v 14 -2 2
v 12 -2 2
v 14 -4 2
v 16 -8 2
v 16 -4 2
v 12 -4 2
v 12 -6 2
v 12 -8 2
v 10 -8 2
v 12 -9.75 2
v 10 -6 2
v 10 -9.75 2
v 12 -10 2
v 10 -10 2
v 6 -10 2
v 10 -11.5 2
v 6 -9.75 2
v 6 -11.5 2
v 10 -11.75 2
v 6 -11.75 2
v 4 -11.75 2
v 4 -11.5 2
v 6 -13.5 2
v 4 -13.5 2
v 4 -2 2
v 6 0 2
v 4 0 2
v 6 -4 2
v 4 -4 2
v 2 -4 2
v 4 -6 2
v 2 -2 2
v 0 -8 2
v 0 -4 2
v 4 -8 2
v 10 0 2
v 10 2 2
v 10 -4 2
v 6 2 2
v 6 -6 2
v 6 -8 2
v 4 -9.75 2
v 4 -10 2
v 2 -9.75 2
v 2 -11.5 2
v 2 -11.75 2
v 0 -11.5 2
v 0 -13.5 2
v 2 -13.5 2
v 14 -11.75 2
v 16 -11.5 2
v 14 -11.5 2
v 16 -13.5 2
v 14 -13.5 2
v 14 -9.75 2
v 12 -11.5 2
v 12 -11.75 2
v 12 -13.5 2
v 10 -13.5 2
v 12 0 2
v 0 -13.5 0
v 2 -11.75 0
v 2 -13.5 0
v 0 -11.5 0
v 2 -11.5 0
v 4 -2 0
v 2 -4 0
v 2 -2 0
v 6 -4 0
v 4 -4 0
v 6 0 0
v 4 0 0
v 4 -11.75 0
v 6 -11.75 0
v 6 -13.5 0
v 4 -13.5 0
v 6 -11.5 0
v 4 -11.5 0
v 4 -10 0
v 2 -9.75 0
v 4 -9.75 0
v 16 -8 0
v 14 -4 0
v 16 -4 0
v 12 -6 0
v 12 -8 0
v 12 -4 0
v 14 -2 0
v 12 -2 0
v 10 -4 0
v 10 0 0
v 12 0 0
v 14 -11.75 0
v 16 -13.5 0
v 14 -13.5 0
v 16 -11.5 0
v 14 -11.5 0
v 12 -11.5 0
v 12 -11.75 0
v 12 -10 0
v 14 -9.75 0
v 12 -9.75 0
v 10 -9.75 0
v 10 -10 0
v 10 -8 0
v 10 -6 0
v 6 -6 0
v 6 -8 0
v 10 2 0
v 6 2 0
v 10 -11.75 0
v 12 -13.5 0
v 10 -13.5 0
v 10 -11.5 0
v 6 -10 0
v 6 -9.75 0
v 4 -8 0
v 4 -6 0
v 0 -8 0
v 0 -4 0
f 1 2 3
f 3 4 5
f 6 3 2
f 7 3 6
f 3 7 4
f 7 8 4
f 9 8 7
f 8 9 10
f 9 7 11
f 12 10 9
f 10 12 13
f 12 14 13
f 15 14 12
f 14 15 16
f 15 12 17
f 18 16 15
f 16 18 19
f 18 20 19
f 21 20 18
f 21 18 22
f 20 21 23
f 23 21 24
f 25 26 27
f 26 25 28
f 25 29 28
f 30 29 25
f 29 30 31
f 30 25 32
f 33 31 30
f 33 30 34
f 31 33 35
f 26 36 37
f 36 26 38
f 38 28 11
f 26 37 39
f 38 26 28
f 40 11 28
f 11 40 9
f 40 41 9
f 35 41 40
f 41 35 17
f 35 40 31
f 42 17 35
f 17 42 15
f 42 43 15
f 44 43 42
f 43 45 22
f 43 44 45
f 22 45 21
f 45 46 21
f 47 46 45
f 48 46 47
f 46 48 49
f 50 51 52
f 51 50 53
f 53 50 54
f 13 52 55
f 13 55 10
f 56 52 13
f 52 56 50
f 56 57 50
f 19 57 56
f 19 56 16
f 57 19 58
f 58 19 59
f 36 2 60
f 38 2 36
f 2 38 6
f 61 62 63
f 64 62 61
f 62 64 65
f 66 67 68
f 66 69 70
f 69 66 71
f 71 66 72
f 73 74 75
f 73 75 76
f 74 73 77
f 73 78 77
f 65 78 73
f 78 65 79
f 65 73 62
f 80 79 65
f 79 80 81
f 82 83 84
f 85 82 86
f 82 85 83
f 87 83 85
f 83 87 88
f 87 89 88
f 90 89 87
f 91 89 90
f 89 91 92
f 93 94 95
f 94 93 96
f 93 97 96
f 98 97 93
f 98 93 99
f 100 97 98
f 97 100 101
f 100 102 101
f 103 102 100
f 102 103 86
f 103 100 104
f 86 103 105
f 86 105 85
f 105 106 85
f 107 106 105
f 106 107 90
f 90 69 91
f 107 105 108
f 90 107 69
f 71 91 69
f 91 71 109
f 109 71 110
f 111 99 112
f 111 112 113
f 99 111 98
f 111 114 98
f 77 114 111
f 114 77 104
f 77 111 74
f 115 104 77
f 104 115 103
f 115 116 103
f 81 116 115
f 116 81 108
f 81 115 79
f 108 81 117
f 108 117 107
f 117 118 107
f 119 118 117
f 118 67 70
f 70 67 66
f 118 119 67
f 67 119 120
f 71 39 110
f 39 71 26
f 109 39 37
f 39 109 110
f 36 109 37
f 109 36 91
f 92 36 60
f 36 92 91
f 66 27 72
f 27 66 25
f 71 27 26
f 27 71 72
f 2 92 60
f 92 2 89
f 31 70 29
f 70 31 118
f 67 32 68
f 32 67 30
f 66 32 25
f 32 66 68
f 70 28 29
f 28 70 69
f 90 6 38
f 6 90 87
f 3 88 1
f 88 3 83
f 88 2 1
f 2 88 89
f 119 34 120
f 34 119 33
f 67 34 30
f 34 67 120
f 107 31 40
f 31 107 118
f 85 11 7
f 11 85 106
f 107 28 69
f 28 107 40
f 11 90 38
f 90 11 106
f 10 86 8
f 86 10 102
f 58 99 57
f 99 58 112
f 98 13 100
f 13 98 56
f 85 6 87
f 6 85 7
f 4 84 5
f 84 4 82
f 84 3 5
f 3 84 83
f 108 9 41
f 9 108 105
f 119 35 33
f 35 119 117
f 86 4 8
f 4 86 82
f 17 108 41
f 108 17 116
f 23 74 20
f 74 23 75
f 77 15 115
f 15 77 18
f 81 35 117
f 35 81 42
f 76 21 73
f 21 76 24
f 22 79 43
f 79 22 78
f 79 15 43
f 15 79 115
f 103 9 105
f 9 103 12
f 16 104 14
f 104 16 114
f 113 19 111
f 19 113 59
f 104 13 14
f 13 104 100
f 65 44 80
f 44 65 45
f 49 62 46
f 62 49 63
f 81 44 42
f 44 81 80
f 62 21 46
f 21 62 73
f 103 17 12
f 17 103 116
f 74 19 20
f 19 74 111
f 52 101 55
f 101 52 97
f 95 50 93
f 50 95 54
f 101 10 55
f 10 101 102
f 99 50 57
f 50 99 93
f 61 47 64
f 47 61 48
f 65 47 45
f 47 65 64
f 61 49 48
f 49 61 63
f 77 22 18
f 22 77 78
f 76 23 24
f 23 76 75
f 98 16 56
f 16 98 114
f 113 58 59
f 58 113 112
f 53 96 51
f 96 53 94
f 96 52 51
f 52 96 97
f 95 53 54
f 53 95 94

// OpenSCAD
union() {
	translate(v = [0, 0, 0]) {
		translate(v = [6, 0, 0]) {
			color(alpha = 1.0, c = "white") {
				cube(size = 2);
			}
		}
	}
	translate(v = [0, 0, 0]) {
		translate(v = [8, 0, 0]) {
			color(alpha = 1.0, c = "white") {
				cube(size = 2);
			}
		}
	}
	translate(v = [0, -2, 0]) {
		translate(v = [4, 0, 0]) {
			color(alpha = 1.0, c = "white") {
				cube(size = 2);
			}
		}
	}
	translate(v = [0, -2, 0]) {
		translate(v = [6, 0, 0]) {
			color(alpha = 1.0, c = "white") {
				cube(size = 2);
			}
		}
	}
	translate(v = [0, -2, 0]) {
		translate(v = [8, 0, 0]) {
			color(alpha = 1.0, c = "white") {
				cube(size = 2);
			}
		}
	}
	translate(v = [0, -2, 0]) {
		translate(v = [10, 0, 0]) {
			color(alpha = 1.0, c = "white") {
				cube(size = 2);
			}
		}
	}
	translate(v = [0, -4, 0]) {
		translate(v = [2, 0, 0]) {
			color(alpha = 1.0, c = "white") {
				cube(size = 2);
			}
		}
	}
	translate(v = [0, -4, 0]) {
		translate(v = [4, 0, 0]) {
			color(alpha = 1.0, c = "white") {
				cube(size = 2);
			}
		}
	}
	translate(v = [0, -4, 0]) {
		translate(v = [6, 0, 0]) {
			color(alpha = 1.0, c = "white") {
				cube(size = 2);
			}
		}
	}
	translate(v = [0, -4, 0]) {
		translate(v = [8, 0, 0]) {
			color(alpha = 1.0, c = "white") {
				cube(size = 2);
			}
		}
	}
	translate(v = [0, -4, 0]) {
		translate(v = [10, 0, 0]) {
			color(alpha = 1.0, c = "white") {
				cube(size = 2);
			}
		}
	}
	translate(v = [0, -4, 0]) {
		translate(v = [12, 0, 0]) {
			color(alpha = 1.0, c = "white") {
				cube(size = 2);
			}
		}
	}
	translate(v = [0, -6, 0]) {
		translate(v = [0, 0, 0]) {
			color(alpha = 1.0, c = "white") {
				cube(size = 2);
			}
		}
	}
	translate(v = [0, -6, 0]) {
		translate(v = [2, 0, 0]) {
			color(alpha = 1.0, c = "white") {
				cube(size = 2);
			}
		}
	}
	translate(v = [0, -6, 0]) {
		translate(v = [6, 0, 0]) {
			color(alpha = 1.0, c = "white") {
				cube(size = 2);
			}
		}
	}
	translate(v = [0, -6, 0]) {
		translate(v = [8, 0, 0]) {
			color(alpha = 1.0, c = "white") {
				cube(size = 2);
			}
		}
	}
	translate(v = [0, -6, 0]) {
		translate(v = [12, 0, 0]) {
			color(alpha = 1.0, c = "white") {
				cube(size = 2);
			}
		}
	}
	translate(v = [0, -6, 0]) {
		translate(v = [14, 0, 0]) {
			color(alpha = 1.0, c = "white") {
				cube(size = 2);
			}
		}
	}
	translate(v = [0, -8, 0]) {
		translate(v = [0, 0, 0]) {
			color(alpha = 1.0, c = "white") {
				cube(size = 2);
			}
		}
	}
	translate(v = [0, -8, 0]) {
		translate(v = [2, 0, 0]) {
			color(alpha = 1.0, c = "white") {
				cube(size = 2);
			}
		}
	}
	translate(v = [0, -8, 0]) {
		translate(v = [4, 0, 0]) {
			color(alpha = 1.0, c = "white") {
				cube(size = 2);
			}
		}
	}
	translate(v = [0, -8, 0]) {
		translate(v = [6, 0, 0]) {
			color(alpha = 1.0, c = "white") {
				cube(size = 2);
			}
		}
	}
	translate(v = [0, -8, 0]) {
		translate(v = [8, 0, 0]) {
			color(alpha = 1.0, c = "white") {
				cube(size = 2);
			}
		}
	}
	translate(v = [0, -8, 0]) {
		translate(v = [10, 0, 0]) {
			color(alpha = 1.0, c = "white") {
				cube(size = 2);
			}
		}
	}
	translate(v = [0, -8, 0]) {
		translate(v = [12, 0, 0]) {
			color(alpha = 1.0, c = "white") {
				cube(size = 2);
			}
		}
	}
	translate(v = [0, -8, 0]) {
		translate(v = [14, 0, 0]) {
			color(alpha = 1.0, c = "white") {
				cube(size = 2);
			}
		}
	}
	translate(v = [0, -10, 0]) {
		translate(v = [4, 0, 0]) {
			color(alpha = 1.0, c = "white") {
				cube(size = 2);
			}
		}
	}
	translate(v = [0, -10, 0]) {
		translate(v = [10, 0, 0]) {
			color(alpha = 1.0, c = "white") {
				cube(size = 2);
			}
		}
	}
	translate(v = [0, 0.25, 0]) {
		translate(v = [0, -12, 0]) {
			translate(v = [2, 0, 0]) {
				color(alpha = 1.0, c = "white") {
					cube(size = 2);
				}
			}
		}
	}
	translate(v = [0, 0.25, 0]) {
		translate(v = [0, -12, 0]) {
			translate(v = [6, 0, 0]) {
				color(alpha = 1.0, c = "white") {
					cube(size = 2);
				}
			}
		}
	}
	translate(v = [0, 0.25, 0]) {
		translate(v = [0, -12, 0]) {
			translate(v = [8, 0, 0]) {
				color(alpha = 1.0, c = "white") {
					cube(size = 2);
				}
			}
		}
	}
	translate(v = [0, 0.25, 0]) {
		translate(v = [0, -12, 0]) {
			translate(v = [12, 0, 0]) {
				color(alpha = 1.0, c = "white") {
					cube(size = 2);
				}
			}
		}
	}
	translate(v = [0, 0.5, 0]) {
		translate(v = [0, -14, 0]) {
			translate(v = [0, 0, 0]) {
				color(alpha = 1.0, c = "white") {
					cube(size = 2);
				}
			}
		}
	}
	translate(v = [0, 0.5, 0]) {
		translate(v = [0, -14, 0]) {
			translate(v = [4, 0, 0]) {
				color(alpha = 1.0, c = "white") {
					cube(size = 2);
				}
			}
		}
	}
	translate(v = [0, 0.5, 0]) {
		translate(v = [0, -14, 0]) {
			translate(v = [10, 0, 0]) {
				color(alpha = 1.0, c = "white") {
					cube(size = 2);
				}
			}
		}
	}
	translate(v = [0, 0.5, 0]) {
		translate(v = [0, -14, 0]) {
			translate(v = [14, 0, 0]) {
				color(alpha = 1.0, c = "white") {
					cube(size = 2);
				}
			}
		}
	}
}
